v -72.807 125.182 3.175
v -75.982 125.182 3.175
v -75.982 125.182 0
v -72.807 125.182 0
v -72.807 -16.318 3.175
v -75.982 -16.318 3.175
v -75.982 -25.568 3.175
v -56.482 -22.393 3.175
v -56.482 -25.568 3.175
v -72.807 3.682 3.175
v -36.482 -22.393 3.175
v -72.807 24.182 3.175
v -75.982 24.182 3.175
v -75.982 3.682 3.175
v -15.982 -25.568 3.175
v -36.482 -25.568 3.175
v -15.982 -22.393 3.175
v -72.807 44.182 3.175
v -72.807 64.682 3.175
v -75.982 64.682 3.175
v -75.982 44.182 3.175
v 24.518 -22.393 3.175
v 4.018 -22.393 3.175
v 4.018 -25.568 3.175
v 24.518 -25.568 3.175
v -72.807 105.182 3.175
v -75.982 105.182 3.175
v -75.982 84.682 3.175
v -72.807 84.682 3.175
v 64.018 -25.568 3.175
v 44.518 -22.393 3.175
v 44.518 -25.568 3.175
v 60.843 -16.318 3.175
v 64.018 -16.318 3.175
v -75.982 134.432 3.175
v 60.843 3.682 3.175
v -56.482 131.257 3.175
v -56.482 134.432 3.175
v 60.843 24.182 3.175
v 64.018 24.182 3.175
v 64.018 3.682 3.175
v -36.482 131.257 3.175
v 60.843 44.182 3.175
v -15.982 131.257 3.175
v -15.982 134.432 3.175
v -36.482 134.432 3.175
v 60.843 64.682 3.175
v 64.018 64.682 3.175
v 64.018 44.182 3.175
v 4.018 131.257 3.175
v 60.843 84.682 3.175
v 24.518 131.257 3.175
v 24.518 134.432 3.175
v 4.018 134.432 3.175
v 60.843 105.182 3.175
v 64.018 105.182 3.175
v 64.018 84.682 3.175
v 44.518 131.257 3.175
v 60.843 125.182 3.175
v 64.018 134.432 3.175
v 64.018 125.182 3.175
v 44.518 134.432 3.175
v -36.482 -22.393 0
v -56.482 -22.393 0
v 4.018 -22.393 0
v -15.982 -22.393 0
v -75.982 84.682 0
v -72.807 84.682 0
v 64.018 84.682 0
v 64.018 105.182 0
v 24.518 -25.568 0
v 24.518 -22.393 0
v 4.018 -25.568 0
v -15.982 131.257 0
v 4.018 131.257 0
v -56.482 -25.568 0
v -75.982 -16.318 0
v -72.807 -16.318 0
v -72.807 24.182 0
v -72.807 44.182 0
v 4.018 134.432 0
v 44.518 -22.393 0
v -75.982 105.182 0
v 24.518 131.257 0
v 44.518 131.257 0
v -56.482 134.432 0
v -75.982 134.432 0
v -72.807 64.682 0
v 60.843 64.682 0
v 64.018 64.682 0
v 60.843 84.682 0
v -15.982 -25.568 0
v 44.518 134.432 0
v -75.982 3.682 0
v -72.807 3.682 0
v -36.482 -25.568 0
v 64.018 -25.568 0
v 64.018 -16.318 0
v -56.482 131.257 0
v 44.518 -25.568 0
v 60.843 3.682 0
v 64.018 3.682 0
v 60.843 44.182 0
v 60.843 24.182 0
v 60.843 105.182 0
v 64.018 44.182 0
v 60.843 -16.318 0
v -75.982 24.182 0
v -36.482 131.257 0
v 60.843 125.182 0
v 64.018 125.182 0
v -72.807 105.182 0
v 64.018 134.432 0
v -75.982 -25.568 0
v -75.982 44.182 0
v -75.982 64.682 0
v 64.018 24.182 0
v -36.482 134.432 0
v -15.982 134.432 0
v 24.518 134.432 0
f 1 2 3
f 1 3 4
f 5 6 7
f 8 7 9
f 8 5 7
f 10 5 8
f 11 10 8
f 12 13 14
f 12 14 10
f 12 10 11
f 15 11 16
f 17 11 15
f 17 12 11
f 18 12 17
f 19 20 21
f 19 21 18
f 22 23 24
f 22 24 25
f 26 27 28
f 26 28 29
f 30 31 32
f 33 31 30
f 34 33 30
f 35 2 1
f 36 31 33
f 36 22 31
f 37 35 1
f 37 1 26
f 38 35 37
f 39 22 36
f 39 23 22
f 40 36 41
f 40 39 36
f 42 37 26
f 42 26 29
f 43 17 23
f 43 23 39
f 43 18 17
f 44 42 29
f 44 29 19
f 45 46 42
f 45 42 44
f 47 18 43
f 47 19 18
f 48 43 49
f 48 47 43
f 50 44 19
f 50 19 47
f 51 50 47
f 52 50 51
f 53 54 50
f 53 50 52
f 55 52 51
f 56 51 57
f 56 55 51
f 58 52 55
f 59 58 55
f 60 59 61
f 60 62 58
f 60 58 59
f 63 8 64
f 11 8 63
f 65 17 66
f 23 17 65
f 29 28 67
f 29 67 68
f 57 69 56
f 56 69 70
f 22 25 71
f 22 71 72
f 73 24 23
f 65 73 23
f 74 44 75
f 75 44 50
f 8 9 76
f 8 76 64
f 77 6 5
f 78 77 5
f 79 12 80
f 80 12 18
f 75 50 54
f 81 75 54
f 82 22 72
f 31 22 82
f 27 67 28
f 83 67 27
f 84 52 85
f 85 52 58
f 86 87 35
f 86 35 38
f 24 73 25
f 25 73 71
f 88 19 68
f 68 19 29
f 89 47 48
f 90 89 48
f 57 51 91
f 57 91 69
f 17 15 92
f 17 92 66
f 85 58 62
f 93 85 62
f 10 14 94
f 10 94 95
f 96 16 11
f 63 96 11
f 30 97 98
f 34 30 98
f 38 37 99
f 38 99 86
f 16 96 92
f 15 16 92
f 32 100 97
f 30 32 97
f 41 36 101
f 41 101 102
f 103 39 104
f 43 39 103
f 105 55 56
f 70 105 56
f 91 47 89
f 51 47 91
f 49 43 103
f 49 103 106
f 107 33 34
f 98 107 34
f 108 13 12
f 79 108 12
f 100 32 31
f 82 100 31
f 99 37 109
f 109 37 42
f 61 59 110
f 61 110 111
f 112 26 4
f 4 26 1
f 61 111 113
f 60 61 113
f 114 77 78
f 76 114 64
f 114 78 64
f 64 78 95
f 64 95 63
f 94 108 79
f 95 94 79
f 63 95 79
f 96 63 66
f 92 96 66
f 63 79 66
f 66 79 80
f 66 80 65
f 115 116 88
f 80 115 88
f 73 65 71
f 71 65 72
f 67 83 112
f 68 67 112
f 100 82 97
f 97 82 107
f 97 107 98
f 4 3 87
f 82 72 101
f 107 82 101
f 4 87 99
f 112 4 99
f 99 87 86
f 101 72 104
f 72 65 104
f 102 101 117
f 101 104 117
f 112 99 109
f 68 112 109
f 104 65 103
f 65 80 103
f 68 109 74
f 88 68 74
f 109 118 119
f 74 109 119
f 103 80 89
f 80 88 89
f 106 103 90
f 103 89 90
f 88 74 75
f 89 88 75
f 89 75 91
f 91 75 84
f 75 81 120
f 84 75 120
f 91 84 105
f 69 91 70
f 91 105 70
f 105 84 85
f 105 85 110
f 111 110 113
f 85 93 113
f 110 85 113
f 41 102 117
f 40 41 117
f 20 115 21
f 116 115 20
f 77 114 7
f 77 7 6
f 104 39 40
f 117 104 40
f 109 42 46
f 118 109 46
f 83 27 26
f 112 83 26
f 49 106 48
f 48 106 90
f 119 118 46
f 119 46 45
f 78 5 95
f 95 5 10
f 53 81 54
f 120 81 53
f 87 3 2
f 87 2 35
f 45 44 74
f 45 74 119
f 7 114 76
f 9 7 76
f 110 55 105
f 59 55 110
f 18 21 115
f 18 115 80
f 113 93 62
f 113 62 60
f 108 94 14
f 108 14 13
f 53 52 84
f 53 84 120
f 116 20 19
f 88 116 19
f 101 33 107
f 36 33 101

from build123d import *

# Parameters (mm, degrees)
SKETCH1_W           = 140
SKETCH1_H           = 160
BOSS_EXTRUDE2_DEPTH = 3.175
CUT_EXTRUDE1_REACH  = 156.451
SKETCH3_W           = 3.175
SKETCH3_H           = 20
SKETCH3_W_2         = 20
SKETCH3_H_2         = 3.175


with BuildPart() as part:
    # Sketch1 → Boss-Extrude2 (new body)
    with BuildSketch(Plane.XY):
        with Locations((-5.981871877, 54.431521206)):
            Rectangle(SKETCH1_W, SKETCH1_H)
    extrude(amount=BOSS_EXTRUDE2_DEPTH)

    # Sketch3 → Cut-Extrude1 (cut, up to next)
    with BuildSketch(Plane.XY.offset(3.175), mode=Mode.PRIVATE) as cut_extrude1_sk1:
        with Locations((-74.394371877, -6.318478794)):
            Rectangle(SKETCH3_W, SKETCH3_H)
    cut_extrude1_tool1 = extrude(cut_extrude1_sk1.sketch, amount=-CUT_EXTRUDE1_REACH, mode=Mode.PRIVATE) & part.part
    # Sketch3 → Cut-Extrude1 (cut, up to next)
    with BuildSketch(Plane.XY.offset(3.175), mode=Mode.PRIVATE) as cut_extrude1_sk2:
        with Locations((-74.394371877, 34.181521206)):
            Rectangle(SKETCH3_W, SKETCH3_H)
    cut_extrude1_tool2 = extrude(cut_extrude1_sk2.sketch, amount=-CUT_EXTRUDE1_REACH, mode=Mode.PRIVATE) & part.part
    # Sketch3 → Cut-Extrude1 (cut, up to next)
    with BuildSketch(Plane.XY.offset(3.175), mode=Mode.PRIVATE) as cut_extrude1_sk3:
        with Locations((-74.394371877, 74.681521206)):
            Rectangle(SKETCH3_W, SKETCH3_H)
    cut_extrude1_tool3 = extrude(cut_extrude1_sk3.sketch, amount=-CUT_EXTRUDE1_REACH, mode=Mode.PRIVATE) & part.part
    # Sketch3 → Cut-Extrude1 (cut, up to next)
    with BuildSketch(Plane.XY.offset(3.175), mode=Mode.PRIVATE) as cut_extrude1_sk4:
        with Locations((-74.394371877, 115.181521206)):
            Rectangle(SKETCH3_W, SKETCH3_H)
    cut_extrude1_tool4 = extrude(cut_extrude1_sk4.sketch, amount=-CUT_EXTRUDE1_REACH, mode=Mode.PRIVATE) & part.part
    # Sketch3 → Cut-Extrude1 (cut, up to next)
    with BuildSketch(Plane.XY.offset(3.175), mode=Mode.PRIVATE) as cut_extrude1_sk5:
        with Locations((-5.981871877, -23.980978794)):
            Rectangle(SKETCH3_W_2, SKETCH3_H_2)
    cut_extrude1_tool5 = extrude(cut_extrude1_sk5.sketch, amount=-CUT_EXTRUDE1_REACH, mode=Mode.PRIVATE) & part.part
    # Sketch3 → Cut-Extrude1 (cut, up to next)
    with BuildSketch(Plane.XY.offset(3.175), mode=Mode.PRIVATE) as cut_extrude1_sk6:
        with Locations((-46.481871877, -23.980978794)):
            Rectangle(SKETCH3_W_2, SKETCH3_H_2)
    cut_extrude1_tool6 = extrude(cut_extrude1_sk6.sketch, amount=-CUT_EXTRUDE1_REACH, mode=Mode.PRIVATE) & part.part
    # Sketch3 → Cut-Extrude1 (cut, up to next)
    with BuildSketch(Plane.XY.offset(3.175), mode=Mode.PRIVATE) as cut_extrude1_sk7:
        with Locations((34.518128123, -23.980978794)):
            Rectangle(SKETCH3_W_2, SKETCH3_H_2)
    cut_extrude1_tool7 = extrude(cut_extrude1_sk7.sketch, amount=-CUT_EXTRUDE1_REACH, mode=Mode.PRIVATE) & part.part
    # Sketch3 → Cut-Extrude1 (cut, up to next)
    with BuildSketch(Plane.XY.offset(3.175), mode=Mode.PRIVATE) as cut_extrude1_sk8:
        with Locations((-46.481871877, 132.844021206)):
            Rectangle(SKETCH3_W_2, SKETCH3_H_2)
    cut_extrude1_tool8 = extrude(cut_extrude1_sk8.sketch, amount=-CUT_EXTRUDE1_REACH, mode=Mode.PRIVATE) & part.part
    # Sketch3 → Cut-Extrude1 (cut, up to next)
    with BuildSketch(Plane.XY.offset(3.175), mode=Mode.PRIVATE) as cut_extrude1_sk9:
        with Locations((-5.981871877, 132.844021206)):
            Rectangle(SKETCH3_W_2, SKETCH3_H_2)
    cut_extrude1_tool9 = extrude(cut_extrude1_sk9.sketch, amount=-CUT_EXTRUDE1_REACH, mode=Mode.PRIVATE) & part.part
    # Sketch3 → Cut-Extrude1 (cut, up to next)
    with BuildSketch(Plane.XY.offset(3.175), mode=Mode.PRIVATE) as cut_extrude1_sk10:
        with Locations((34.518128123, 132.844021206)):
            Rectangle(SKETCH3_W_2, SKETCH3_H_2)
    cut_extrude1_tool10 = extrude(cut_extrude1_sk10.sketch, amount=-CUT_EXTRUDE1_REACH, mode=Mode.PRIVATE) & part.part
    # Sketch3 → Cut-Extrude1 (cut, up to next)
    with BuildSketch(Plane.XY.offset(3.175), mode=Mode.PRIVATE) as cut_extrude1_sk11:
        with Locations((62.430628123, 115.181521206)):
            Rectangle(SKETCH3_W, SKETCH3_H)
    cut_extrude1_tool11 = extrude(cut_extrude1_sk11.sketch, amount=-CUT_EXTRUDE1_REACH, mode=Mode.PRIVATE) & part.part
    # Sketch3 → Cut-Extrude1 (cut, up to next)
    with BuildSketch(Plane.XY.offset(3.175), mode=Mode.PRIVATE) as cut_extrude1_sk12:
        with Locations((62.430628123, 74.681521206)):
            Rectangle(SKETCH3_W, SKETCH3_H)
    cut_extrude1_tool12 = extrude(cut_extrude1_sk12.sketch, amount=-CUT_EXTRUDE1_REACH, mode=Mode.PRIVATE) & part.part
    # Sketch3 → Cut-Extrude1 (cut, up to next)
    with BuildSketch(Plane.XY.offset(3.175), mode=Mode.PRIVATE) as cut_extrude1_sk13:
        with Locations((62.430628123, 34.181521206)):
            Rectangle(SKETCH3_W, SKETCH3_H)
    cut_extrude1_tool13 = extrude(cut_extrude1_sk13.sketch, amount=-CUT_EXTRUDE1_REACH, mode=Mode.PRIVATE) & part.part
    # Sketch3 → Cut-Extrude1 (cut, up to next)
    with BuildSketch(Plane.XY.offset(3.175), mode=Mode.PRIVATE) as cut_extrude1_sk14:
        with Locations((62.430628123, -6.318478794)):
            Rectangle(SKETCH3_W, SKETCH3_H)
    cut_extrude1_tool14 = extrude(cut_extrude1_sk14.sketch, amount=-CUT_EXTRUDE1_REACH, mode=Mode.PRIVATE) & part.part
    add(cut_extrude1_tool1.solids().sort_by_distance((-74.394372, -6.318479, 3.175))[0], mode=Mode.SUBTRACT)
    add(cut_extrude1_tool2.solids().sort_by_distance((-74.394372, 34.181521, 3.175))[0], mode=Mode.SUBTRACT)
    add(cut_extrude1_tool3.solids().sort_by_distance((-74.394372, 74.681521, 3.175))[0], mode=Mode.SUBTRACT)
    add(cut_extrude1_tool4.solids().sort_by_distance((-74.394372, 115.181521, 3.175))[0], mode=Mode.SUBTRACT)
    add(cut_extrude1_tool5.solids().sort_by_distance((-5.981872, -23.980979, 3.175))[0], mode=Mode.SUBTRACT)
    add(cut_extrude1_tool6.solids().sort_by_distance((-46.481872, -23.980979, 3.175))[0], mode=Mode.SUBTRACT)
    add(cut_extrude1_tool7.solids().sort_by_distance((34.518128, -23.980979, 3.175))[0], mode=Mode.SUBTRACT)
    add(cut_extrude1_tool8.solids().sort_by_distance((-46.481872, 132.844021, 3.175))[0], mode=Mode.SUBTRACT)
    add(cut_extrude1_tool9.solids().sort_by_distance((-5.981872, 132.844021, 3.175))[0], mode=Mode.SUBTRACT)
    add(cut_extrude1_tool10.solids().sort_by_distance((34.518128, 132.844021, 3.175))[0], mode=Mode.SUBTRACT)
    add(cut_extrude1_tool11.solids().sort_by_distance((62.430628, 115.181521, 3.175))[0], mode=Mode.SUBTRACT)
    add(cut_extrude1_tool12.solids().sort_by_distance((62.430628, 74.681521, 3.175))[0], mode=Mode.SUBTRACT)
    add(cut_extrude1_tool13.solids().sort_by_distance((62.430628, 34.181521, 3.175))[0], mode=Mode.SUBTRACT)
    add(cut_extrude1_tool14.solids().sort_by_distance((62.430628, -6.318479, 3.175))[0], mode=Mode.SUBTRACT)


solid = part.part
